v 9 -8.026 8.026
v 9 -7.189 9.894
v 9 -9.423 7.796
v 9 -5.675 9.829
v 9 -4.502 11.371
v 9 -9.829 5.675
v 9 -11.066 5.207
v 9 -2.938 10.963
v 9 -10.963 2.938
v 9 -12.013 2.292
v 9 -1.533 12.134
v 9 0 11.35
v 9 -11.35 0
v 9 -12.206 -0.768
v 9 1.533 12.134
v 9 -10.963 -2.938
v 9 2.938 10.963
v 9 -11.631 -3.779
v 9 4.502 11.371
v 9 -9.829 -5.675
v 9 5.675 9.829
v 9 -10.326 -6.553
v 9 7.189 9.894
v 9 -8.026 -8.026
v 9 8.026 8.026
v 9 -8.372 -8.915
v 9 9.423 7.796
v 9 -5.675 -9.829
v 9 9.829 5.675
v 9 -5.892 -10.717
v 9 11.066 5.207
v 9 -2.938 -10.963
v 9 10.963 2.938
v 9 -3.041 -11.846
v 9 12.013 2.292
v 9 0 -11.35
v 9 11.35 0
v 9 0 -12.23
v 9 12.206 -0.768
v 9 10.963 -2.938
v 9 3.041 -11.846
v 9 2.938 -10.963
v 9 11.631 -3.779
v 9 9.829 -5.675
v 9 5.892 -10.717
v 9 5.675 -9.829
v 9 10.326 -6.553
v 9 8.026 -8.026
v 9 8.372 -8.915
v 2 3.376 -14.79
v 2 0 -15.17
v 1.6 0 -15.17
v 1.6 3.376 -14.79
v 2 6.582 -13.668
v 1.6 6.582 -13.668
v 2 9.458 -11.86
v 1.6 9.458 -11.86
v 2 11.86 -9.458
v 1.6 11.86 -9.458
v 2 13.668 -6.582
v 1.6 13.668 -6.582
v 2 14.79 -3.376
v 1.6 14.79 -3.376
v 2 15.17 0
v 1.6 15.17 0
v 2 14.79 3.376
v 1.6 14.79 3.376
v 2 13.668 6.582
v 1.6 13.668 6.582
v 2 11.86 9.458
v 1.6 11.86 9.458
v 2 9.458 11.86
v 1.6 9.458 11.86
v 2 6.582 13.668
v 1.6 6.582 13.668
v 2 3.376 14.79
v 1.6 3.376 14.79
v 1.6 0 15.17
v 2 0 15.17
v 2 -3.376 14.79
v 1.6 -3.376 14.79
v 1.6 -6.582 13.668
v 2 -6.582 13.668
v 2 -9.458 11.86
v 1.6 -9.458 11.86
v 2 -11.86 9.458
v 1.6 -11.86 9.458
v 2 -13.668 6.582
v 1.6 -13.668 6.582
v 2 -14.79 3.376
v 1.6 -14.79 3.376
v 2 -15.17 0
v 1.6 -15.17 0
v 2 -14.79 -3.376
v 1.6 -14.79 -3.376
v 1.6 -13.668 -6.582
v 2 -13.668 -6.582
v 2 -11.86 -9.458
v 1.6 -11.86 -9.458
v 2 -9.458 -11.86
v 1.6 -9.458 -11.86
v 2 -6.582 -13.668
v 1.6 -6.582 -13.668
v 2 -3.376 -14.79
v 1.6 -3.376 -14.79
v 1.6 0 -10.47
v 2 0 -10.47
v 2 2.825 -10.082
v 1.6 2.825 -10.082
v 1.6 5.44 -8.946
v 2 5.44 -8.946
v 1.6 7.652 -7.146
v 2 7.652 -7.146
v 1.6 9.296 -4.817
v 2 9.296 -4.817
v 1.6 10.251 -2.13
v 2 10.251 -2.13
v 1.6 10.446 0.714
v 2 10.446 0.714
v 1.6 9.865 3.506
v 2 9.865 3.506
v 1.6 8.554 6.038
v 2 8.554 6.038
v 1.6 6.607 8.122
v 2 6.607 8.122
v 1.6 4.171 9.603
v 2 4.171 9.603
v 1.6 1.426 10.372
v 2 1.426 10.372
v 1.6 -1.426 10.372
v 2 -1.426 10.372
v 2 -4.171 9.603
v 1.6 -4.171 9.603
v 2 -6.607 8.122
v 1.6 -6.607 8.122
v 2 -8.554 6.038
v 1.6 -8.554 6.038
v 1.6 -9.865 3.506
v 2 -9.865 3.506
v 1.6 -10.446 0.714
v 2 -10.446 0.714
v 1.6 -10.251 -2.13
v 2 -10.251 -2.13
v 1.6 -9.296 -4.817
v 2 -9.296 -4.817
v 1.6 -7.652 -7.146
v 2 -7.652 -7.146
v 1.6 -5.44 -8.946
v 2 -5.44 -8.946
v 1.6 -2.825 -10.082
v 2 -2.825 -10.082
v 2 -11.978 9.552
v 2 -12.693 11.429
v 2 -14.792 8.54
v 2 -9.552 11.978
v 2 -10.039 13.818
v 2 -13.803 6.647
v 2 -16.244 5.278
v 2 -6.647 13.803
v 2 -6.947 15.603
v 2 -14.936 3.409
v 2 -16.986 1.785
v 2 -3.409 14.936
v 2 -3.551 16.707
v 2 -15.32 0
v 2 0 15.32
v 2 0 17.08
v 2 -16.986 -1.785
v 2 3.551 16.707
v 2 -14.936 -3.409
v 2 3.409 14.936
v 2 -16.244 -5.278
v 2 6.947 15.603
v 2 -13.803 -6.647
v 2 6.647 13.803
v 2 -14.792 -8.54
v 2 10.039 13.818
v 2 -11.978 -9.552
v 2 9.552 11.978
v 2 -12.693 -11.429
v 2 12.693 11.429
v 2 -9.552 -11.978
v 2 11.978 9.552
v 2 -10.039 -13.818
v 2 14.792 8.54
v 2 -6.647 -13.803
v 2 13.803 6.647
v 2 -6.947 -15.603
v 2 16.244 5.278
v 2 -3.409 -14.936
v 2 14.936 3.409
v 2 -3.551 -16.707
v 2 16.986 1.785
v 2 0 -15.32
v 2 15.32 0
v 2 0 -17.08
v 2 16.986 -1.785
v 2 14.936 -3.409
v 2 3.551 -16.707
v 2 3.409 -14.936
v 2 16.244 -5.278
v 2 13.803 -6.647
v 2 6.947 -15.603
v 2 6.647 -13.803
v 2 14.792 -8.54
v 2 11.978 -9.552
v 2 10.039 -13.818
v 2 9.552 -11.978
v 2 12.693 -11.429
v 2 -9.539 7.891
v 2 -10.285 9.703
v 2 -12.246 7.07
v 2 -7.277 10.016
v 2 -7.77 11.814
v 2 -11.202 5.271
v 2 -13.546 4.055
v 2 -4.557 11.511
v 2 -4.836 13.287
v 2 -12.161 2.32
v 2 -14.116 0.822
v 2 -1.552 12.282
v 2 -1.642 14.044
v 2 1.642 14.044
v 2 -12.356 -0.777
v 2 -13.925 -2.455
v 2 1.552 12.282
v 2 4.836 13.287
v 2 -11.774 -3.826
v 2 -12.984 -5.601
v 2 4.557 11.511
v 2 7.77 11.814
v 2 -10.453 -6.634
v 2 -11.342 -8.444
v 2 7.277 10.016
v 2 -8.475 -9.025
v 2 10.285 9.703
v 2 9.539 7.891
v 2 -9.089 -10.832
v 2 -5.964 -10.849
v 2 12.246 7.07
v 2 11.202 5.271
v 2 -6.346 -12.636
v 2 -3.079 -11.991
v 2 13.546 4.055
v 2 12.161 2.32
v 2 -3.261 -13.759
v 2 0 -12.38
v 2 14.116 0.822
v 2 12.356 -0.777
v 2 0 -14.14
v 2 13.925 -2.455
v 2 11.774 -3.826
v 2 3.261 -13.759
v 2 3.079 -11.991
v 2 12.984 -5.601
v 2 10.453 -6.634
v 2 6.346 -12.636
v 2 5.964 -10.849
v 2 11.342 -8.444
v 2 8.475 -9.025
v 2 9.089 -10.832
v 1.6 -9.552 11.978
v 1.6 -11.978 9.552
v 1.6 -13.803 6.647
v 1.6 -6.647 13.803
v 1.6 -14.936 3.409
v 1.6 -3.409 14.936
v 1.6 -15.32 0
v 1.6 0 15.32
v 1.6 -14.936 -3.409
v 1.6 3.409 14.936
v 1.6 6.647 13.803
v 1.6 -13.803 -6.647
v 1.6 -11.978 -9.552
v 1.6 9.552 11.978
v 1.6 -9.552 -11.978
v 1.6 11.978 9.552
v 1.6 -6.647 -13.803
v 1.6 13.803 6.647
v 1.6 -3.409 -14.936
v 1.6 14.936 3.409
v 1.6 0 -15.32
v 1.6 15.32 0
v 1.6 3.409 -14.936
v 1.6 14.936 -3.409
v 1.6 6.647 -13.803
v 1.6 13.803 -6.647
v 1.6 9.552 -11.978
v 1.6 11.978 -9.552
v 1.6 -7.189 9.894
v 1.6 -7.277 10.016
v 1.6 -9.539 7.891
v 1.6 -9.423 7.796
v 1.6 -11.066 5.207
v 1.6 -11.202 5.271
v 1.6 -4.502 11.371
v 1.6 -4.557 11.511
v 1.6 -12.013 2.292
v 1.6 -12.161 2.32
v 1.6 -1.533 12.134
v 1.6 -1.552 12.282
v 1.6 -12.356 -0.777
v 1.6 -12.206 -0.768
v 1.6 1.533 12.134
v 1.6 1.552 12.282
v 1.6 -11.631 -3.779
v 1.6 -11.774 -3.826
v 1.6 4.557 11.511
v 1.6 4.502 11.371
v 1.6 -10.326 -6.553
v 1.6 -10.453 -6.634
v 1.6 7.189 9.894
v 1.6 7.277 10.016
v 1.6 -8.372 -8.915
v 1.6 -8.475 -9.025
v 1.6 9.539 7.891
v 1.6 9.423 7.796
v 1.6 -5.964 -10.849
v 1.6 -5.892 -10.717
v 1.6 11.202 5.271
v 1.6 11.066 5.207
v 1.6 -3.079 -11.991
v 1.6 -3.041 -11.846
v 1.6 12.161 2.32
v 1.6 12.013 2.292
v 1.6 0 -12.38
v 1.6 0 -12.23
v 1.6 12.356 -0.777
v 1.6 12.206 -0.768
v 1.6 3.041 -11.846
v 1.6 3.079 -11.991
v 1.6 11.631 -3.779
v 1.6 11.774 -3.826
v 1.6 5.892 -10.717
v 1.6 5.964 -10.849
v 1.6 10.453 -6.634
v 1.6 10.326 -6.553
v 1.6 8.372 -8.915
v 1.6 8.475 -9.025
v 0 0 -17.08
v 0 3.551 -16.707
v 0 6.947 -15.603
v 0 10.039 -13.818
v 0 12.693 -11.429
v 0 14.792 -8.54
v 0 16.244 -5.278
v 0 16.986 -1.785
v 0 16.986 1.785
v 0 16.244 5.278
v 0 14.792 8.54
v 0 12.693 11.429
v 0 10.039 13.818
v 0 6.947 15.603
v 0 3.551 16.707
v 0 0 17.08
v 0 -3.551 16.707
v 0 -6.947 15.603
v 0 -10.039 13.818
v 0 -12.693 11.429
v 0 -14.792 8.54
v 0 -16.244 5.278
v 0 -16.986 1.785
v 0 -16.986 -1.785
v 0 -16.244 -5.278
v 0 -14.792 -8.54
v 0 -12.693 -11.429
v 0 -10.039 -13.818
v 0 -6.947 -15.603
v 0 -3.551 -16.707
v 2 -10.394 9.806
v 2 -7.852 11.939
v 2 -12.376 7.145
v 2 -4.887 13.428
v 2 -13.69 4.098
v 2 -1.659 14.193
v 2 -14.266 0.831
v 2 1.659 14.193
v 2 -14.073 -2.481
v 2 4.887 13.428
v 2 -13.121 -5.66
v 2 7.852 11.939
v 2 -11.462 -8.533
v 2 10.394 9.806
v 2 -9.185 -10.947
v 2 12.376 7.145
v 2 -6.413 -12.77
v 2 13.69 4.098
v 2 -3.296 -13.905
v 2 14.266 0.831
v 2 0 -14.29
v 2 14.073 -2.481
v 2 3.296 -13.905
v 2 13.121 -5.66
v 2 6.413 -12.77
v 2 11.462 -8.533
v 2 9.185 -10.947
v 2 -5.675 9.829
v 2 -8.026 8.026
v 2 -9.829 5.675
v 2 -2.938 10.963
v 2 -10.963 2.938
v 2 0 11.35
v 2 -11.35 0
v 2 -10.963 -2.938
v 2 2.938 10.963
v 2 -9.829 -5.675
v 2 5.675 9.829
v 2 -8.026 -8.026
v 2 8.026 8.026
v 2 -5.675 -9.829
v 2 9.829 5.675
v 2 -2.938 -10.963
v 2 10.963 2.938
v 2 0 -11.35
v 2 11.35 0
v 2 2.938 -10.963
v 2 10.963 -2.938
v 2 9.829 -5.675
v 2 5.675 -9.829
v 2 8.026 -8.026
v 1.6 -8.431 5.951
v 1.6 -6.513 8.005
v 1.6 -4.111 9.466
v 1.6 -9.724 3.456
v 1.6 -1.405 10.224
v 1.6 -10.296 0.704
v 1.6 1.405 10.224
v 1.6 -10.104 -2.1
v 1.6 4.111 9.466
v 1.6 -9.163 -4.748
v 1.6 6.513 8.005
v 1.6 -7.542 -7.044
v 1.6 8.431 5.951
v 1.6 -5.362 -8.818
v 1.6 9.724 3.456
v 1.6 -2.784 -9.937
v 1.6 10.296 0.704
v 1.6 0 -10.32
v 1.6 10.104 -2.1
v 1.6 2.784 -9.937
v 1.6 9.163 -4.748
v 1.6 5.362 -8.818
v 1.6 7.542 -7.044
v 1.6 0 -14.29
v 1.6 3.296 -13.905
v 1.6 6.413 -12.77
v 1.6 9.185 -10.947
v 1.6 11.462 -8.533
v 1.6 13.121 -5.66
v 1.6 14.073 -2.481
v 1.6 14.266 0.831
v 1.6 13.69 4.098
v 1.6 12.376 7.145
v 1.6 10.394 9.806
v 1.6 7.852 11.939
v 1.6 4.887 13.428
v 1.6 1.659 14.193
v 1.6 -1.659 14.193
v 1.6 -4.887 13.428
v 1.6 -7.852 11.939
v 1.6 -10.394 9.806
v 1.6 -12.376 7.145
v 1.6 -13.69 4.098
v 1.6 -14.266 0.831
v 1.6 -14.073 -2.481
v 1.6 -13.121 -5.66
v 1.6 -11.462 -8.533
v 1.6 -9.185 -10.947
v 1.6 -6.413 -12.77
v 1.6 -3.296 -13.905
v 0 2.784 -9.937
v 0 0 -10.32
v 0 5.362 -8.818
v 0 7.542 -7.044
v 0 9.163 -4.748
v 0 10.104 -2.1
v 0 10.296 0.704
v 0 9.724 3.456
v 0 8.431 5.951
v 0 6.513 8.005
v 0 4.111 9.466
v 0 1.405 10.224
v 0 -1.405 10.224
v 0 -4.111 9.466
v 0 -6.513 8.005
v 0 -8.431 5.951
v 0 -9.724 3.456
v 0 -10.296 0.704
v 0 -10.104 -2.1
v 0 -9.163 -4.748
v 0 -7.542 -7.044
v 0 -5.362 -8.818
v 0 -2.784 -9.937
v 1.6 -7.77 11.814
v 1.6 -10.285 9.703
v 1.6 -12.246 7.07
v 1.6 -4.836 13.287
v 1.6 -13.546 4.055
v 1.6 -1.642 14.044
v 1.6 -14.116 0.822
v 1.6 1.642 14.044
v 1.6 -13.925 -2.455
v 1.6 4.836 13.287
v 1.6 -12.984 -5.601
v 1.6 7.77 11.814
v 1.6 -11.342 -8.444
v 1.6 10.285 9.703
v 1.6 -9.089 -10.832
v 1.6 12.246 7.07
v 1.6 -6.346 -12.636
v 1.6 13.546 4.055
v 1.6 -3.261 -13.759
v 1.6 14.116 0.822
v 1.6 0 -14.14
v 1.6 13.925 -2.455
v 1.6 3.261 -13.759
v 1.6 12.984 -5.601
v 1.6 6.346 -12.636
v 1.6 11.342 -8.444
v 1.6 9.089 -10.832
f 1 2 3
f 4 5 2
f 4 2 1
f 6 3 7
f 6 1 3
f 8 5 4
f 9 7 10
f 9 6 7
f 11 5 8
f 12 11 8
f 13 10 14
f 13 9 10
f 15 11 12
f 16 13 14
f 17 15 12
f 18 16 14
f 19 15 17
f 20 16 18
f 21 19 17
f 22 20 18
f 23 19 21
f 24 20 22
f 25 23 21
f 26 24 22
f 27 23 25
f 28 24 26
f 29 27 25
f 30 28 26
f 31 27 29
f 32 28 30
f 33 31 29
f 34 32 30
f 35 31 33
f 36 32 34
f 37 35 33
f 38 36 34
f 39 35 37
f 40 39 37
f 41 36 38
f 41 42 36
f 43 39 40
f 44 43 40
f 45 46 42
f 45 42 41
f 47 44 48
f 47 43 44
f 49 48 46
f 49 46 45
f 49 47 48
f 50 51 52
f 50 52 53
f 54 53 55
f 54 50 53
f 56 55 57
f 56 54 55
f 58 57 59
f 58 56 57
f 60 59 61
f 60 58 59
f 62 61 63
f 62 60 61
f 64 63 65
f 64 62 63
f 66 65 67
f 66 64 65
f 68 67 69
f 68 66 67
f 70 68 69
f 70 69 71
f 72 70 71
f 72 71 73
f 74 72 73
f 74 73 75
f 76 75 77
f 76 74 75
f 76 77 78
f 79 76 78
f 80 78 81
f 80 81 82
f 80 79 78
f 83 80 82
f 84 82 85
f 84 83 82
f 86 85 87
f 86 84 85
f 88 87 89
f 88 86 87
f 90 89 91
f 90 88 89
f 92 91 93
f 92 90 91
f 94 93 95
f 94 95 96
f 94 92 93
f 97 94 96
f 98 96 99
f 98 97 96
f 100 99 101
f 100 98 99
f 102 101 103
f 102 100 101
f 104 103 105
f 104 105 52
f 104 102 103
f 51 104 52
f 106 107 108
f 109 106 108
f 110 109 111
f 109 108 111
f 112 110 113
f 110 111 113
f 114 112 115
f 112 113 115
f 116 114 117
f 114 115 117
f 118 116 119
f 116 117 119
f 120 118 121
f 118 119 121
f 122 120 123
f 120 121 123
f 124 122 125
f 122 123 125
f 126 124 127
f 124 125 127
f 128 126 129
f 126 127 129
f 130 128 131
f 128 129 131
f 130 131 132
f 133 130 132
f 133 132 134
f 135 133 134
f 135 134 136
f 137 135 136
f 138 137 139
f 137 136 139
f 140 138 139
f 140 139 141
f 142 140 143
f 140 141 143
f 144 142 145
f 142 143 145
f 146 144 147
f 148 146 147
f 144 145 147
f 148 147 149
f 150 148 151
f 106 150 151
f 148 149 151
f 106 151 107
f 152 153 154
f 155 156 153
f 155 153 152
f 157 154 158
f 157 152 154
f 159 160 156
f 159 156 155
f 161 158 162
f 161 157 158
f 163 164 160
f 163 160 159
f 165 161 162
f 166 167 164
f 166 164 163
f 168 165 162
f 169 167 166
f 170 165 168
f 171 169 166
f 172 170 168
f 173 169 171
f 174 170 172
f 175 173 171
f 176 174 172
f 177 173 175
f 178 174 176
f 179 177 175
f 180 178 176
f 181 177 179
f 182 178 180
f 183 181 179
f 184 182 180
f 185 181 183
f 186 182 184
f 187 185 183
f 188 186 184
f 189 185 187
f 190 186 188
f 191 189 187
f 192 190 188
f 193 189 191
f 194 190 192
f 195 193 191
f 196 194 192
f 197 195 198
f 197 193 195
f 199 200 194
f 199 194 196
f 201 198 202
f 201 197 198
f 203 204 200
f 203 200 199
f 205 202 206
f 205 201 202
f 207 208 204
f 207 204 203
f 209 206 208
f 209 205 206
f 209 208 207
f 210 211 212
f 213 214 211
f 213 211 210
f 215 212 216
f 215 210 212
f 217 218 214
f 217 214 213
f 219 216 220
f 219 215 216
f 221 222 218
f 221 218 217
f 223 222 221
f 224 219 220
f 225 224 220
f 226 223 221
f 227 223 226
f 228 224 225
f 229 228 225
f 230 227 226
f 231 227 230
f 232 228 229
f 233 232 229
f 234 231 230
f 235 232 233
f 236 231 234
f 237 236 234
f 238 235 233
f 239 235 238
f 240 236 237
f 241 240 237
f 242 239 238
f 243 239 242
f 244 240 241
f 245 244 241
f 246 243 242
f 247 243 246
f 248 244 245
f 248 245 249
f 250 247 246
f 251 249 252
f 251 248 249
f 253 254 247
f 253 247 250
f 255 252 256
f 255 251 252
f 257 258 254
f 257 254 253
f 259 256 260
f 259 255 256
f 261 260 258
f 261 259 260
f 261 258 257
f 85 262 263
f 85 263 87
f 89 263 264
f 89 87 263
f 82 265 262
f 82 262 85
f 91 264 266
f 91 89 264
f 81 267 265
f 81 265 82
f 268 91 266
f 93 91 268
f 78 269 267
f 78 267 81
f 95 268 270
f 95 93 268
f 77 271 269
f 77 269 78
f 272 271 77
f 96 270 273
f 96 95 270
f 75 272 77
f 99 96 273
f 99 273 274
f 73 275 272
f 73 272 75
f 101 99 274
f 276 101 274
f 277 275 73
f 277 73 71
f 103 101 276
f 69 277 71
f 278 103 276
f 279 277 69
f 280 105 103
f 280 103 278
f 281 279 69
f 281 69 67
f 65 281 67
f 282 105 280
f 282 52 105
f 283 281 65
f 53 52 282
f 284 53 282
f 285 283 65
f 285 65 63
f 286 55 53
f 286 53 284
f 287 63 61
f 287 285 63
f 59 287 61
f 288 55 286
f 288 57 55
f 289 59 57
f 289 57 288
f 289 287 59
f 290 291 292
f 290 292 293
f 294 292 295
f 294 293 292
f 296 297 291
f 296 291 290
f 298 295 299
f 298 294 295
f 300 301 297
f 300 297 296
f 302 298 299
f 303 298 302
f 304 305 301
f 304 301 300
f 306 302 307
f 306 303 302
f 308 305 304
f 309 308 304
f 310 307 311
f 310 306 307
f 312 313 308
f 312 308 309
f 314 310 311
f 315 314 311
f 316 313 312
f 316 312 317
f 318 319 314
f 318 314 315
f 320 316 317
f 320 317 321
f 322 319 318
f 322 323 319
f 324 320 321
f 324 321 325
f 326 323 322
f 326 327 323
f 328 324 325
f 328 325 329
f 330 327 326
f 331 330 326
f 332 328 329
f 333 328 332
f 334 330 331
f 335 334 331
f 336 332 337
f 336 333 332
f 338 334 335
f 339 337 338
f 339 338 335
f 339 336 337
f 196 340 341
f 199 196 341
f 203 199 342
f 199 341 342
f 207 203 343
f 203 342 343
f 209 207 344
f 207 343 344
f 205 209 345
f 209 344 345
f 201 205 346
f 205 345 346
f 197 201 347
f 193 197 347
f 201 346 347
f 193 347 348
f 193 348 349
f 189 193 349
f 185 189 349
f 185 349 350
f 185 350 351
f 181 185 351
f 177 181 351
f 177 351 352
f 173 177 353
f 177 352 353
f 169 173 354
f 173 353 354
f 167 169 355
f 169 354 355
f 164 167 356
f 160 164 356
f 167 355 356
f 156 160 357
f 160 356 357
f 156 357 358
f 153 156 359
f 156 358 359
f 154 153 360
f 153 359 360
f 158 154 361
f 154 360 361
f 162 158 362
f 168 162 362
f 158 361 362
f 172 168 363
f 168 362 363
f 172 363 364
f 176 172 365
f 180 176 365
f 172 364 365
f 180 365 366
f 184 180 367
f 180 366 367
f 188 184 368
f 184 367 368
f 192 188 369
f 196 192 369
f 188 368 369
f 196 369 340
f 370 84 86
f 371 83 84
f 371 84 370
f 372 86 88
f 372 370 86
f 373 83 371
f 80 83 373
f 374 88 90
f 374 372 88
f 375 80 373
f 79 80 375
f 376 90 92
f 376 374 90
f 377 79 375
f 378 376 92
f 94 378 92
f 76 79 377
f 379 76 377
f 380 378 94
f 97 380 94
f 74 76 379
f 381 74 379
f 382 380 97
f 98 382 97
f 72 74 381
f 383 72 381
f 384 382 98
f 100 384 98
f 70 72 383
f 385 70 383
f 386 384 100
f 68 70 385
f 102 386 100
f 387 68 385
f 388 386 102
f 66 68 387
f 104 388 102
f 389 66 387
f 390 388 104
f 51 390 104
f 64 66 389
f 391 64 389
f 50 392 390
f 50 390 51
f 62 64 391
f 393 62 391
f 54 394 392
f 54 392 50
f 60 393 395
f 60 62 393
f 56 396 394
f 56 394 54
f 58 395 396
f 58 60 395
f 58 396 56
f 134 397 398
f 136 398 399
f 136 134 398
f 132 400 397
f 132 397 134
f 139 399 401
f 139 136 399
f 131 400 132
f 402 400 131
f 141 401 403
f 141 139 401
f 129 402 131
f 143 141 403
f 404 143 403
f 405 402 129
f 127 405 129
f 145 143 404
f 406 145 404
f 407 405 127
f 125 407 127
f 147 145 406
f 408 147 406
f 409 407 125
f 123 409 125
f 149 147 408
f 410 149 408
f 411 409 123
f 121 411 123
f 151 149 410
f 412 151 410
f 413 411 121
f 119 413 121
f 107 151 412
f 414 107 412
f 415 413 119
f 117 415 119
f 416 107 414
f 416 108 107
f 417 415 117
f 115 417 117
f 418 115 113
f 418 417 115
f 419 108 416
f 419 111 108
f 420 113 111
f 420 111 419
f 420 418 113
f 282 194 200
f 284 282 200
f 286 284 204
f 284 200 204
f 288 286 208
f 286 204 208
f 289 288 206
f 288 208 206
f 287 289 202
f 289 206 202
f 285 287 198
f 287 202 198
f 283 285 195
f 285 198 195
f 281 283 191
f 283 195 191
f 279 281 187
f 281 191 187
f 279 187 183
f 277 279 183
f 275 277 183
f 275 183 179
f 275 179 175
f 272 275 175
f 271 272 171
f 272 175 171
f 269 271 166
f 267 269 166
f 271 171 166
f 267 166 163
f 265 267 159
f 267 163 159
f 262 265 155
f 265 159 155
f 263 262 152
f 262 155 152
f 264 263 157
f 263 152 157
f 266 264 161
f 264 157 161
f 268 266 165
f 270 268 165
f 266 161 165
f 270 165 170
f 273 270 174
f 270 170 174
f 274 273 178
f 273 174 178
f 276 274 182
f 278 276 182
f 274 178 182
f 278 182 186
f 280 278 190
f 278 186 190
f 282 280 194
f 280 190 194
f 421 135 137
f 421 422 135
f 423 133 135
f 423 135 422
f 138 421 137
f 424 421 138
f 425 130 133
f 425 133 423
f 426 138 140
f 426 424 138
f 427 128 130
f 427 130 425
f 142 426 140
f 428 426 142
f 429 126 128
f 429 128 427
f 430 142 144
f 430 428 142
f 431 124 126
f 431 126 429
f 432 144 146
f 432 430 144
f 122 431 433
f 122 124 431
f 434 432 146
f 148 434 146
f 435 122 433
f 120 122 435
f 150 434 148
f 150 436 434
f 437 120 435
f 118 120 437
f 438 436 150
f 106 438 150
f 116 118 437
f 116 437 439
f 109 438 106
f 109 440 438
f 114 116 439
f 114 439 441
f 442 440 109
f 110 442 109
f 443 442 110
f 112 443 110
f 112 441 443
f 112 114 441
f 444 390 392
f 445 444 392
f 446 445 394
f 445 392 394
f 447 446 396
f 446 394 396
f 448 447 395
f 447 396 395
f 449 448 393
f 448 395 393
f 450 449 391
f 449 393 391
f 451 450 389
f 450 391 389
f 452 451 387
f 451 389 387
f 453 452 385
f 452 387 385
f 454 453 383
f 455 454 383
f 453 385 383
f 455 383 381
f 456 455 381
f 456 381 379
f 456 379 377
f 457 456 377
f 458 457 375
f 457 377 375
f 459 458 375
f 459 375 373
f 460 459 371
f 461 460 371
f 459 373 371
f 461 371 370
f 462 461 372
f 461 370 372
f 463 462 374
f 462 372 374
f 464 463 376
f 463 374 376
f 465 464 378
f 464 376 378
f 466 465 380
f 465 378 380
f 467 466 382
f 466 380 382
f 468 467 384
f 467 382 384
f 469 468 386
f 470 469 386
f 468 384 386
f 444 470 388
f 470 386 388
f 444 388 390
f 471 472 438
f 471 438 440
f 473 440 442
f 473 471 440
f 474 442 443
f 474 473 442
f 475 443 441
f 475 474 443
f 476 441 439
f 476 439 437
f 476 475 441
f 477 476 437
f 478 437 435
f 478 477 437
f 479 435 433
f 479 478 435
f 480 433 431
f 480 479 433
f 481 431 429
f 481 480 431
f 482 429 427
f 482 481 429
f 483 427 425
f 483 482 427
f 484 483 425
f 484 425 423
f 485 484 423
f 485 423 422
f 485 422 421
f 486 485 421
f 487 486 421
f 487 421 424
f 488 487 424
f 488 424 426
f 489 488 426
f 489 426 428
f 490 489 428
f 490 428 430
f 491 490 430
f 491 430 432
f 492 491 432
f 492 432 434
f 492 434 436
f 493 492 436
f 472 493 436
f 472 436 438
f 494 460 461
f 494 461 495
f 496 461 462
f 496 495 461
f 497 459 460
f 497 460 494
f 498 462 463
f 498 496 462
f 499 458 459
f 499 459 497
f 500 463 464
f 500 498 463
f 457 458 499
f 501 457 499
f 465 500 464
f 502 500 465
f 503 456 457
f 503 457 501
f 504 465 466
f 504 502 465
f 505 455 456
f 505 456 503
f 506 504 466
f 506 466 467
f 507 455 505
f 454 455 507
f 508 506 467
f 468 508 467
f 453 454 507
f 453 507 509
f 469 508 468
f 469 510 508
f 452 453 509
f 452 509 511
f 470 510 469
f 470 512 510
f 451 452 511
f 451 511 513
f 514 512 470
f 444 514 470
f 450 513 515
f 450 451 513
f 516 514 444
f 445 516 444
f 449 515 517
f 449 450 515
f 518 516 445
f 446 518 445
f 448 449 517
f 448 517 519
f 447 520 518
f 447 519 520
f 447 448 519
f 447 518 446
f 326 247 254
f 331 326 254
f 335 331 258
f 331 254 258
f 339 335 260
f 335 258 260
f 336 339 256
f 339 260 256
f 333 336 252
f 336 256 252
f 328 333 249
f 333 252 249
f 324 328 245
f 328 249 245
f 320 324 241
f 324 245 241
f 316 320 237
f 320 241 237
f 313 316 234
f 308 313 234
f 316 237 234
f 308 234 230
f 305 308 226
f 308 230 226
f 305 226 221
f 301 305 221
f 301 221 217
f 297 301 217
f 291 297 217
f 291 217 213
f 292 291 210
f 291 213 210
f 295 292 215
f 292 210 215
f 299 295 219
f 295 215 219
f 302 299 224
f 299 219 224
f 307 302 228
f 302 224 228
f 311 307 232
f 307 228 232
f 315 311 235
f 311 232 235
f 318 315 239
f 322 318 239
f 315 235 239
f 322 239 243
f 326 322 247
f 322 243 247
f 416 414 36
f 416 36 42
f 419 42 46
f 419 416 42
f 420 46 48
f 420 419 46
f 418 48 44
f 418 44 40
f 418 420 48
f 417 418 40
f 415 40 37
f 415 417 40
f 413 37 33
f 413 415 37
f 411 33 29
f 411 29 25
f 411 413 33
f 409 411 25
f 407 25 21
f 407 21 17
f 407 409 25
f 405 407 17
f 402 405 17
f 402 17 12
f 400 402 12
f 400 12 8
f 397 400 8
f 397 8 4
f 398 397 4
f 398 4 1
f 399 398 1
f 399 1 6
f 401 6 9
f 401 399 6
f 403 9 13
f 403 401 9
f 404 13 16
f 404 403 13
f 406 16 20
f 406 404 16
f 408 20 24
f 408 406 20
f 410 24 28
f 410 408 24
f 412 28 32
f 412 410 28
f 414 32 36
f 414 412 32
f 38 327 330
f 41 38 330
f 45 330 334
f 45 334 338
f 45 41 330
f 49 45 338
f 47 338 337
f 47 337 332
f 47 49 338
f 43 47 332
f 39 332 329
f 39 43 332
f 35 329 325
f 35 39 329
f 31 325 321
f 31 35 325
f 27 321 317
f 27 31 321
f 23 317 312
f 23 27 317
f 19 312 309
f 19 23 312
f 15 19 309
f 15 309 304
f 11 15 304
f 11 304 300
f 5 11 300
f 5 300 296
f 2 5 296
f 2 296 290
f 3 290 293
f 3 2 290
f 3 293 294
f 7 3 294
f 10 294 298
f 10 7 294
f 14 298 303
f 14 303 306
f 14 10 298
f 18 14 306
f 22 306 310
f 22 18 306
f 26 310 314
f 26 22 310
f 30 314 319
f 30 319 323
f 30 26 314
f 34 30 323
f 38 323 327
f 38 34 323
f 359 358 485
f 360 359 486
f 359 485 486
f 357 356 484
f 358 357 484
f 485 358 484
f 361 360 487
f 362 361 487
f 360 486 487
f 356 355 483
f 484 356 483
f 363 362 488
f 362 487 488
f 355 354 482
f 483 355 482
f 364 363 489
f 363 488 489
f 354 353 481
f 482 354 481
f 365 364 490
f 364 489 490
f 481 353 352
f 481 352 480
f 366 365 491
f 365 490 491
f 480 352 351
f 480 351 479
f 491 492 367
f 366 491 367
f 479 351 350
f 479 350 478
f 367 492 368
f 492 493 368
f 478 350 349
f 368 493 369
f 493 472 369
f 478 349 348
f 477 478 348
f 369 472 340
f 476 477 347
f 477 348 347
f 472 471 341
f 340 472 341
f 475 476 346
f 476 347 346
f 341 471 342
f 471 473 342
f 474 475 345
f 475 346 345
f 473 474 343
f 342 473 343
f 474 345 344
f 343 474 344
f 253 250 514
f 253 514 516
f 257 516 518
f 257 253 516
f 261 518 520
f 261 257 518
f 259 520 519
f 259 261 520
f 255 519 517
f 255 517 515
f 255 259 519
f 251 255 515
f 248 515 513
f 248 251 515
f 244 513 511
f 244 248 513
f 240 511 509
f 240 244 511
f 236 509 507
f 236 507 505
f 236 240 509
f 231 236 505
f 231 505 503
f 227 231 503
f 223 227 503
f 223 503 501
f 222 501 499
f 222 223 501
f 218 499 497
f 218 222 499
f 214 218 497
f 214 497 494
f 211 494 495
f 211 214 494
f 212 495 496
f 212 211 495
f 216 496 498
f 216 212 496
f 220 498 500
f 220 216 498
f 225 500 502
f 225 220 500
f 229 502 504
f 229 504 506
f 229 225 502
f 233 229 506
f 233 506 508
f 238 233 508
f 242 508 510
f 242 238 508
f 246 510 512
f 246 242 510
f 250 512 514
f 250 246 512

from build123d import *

# Parameters (mm, degrees)
SKETCH1_R           = 17.08
SKETCH1_R_2         = 10.32
BOSS_EXTRUDE1_DEPTH = 2
SKETCH2_R           = 12.23
SKETCH2_R_2         = 11.35
BOSS_EXTRUDE2_DEPTH = 7
SKETCH3_R           = 10.47
SKETCH3_R_2         = 10.32
CUT_EXTRUDE1_DEPTH  = 0.4
SKETCH12_R          = 12.38
SKETCH12_R_2        = 12.23
CUT_EXTRUDE7_DEPTH  = 0.4
SKETCH13_R          = 14.29
SKETCH13_R_2        = 14.14
CUT_EXTRUDE8_DEPTH  = 0.4
SKETCH14_R          = 15.32
SKETCH14_R_2        = 15.17
CUT_EXTRUDE9_DEPTH  = 0.4


with BuildPart() as part:
    # Sketch1 → Boss-Extrude1 (new body)
    with BuildSketch(Plane(origin=(0, 0, 0), x_dir=(0, 0, -1), z_dir=(1, 0, 0))):
        Circle(SKETCH1_R)
        Circle(SKETCH1_R_2, mode=Mode.SUBTRACT)
    extrude(amount=BOSS_EXTRUDE1_DEPTH)

    # Sketch2 → Boss-Extrude2 (add)
    with BuildSketch(Plane(origin=(2, 0, 0), x_dir=(0, 0, -1), z_dir=(1, 0, 0))):
        Circle(SKETCH2_R)
        Circle(SKETCH2_R_2, mode=Mode.SUBTRACT)
    extrude(amount=BOSS_EXTRUDE2_DEPTH)

    # Sketch3 → Cut-Extrude1 (cut)
    with BuildSketch(Plane(origin=(2, 0, 0), x_dir=(0, 0, -1), z_dir=(1, 0, 0))):
        Circle(SKETCH3_R)
        Circle(SKETCH3_R_2, mode=Mode.SUBTRACT)
    extrude(amount=-CUT_EXTRUDE1_DEPTH, mode=Mode.SUBTRACT)

    # Sketch12 → Cut-Extrude7 (cut)
    with BuildSketch(Plane(origin=(2, 0, 0), x_dir=(0, 0, -1), z_dir=(1, 0, 0))):
        Circle(SKETCH12_R)
        Circle(SKETCH12_R_2, mode=Mode.SUBTRACT)
    extrude(amount=-CUT_EXTRUDE7_DEPTH, mode=Mode.SUBTRACT)

    # Sketch13 → Cut-Extrude8 (cut)
    with BuildSketch(Plane(origin=(2, 0, 0), x_dir=(0, 0, -1), z_dir=(1, 0, 0))):
        Circle(SKETCH13_R)
        Circle(SKETCH13_R_2, mode=Mode.SUBTRACT)
    extrude(amount=-CUT_EXTRUDE8_DEPTH, mode=Mode.SUBTRACT)

    # Sketch14 → Cut-Extrude9 (cut)
    with BuildSketch(Plane(origin=(2, 0, 0), x_dir=(0, 0, -1), z_dir=(1, 0, 0))):
        Circle(SKETCH14_R)
        Circle(SKETCH14_R_2, mode=Mode.SUBTRACT)
    extrude(amount=-CUT_EXTRUDE9_DEPTH, mode=Mode.SUBTRACT)


solid = part.part
